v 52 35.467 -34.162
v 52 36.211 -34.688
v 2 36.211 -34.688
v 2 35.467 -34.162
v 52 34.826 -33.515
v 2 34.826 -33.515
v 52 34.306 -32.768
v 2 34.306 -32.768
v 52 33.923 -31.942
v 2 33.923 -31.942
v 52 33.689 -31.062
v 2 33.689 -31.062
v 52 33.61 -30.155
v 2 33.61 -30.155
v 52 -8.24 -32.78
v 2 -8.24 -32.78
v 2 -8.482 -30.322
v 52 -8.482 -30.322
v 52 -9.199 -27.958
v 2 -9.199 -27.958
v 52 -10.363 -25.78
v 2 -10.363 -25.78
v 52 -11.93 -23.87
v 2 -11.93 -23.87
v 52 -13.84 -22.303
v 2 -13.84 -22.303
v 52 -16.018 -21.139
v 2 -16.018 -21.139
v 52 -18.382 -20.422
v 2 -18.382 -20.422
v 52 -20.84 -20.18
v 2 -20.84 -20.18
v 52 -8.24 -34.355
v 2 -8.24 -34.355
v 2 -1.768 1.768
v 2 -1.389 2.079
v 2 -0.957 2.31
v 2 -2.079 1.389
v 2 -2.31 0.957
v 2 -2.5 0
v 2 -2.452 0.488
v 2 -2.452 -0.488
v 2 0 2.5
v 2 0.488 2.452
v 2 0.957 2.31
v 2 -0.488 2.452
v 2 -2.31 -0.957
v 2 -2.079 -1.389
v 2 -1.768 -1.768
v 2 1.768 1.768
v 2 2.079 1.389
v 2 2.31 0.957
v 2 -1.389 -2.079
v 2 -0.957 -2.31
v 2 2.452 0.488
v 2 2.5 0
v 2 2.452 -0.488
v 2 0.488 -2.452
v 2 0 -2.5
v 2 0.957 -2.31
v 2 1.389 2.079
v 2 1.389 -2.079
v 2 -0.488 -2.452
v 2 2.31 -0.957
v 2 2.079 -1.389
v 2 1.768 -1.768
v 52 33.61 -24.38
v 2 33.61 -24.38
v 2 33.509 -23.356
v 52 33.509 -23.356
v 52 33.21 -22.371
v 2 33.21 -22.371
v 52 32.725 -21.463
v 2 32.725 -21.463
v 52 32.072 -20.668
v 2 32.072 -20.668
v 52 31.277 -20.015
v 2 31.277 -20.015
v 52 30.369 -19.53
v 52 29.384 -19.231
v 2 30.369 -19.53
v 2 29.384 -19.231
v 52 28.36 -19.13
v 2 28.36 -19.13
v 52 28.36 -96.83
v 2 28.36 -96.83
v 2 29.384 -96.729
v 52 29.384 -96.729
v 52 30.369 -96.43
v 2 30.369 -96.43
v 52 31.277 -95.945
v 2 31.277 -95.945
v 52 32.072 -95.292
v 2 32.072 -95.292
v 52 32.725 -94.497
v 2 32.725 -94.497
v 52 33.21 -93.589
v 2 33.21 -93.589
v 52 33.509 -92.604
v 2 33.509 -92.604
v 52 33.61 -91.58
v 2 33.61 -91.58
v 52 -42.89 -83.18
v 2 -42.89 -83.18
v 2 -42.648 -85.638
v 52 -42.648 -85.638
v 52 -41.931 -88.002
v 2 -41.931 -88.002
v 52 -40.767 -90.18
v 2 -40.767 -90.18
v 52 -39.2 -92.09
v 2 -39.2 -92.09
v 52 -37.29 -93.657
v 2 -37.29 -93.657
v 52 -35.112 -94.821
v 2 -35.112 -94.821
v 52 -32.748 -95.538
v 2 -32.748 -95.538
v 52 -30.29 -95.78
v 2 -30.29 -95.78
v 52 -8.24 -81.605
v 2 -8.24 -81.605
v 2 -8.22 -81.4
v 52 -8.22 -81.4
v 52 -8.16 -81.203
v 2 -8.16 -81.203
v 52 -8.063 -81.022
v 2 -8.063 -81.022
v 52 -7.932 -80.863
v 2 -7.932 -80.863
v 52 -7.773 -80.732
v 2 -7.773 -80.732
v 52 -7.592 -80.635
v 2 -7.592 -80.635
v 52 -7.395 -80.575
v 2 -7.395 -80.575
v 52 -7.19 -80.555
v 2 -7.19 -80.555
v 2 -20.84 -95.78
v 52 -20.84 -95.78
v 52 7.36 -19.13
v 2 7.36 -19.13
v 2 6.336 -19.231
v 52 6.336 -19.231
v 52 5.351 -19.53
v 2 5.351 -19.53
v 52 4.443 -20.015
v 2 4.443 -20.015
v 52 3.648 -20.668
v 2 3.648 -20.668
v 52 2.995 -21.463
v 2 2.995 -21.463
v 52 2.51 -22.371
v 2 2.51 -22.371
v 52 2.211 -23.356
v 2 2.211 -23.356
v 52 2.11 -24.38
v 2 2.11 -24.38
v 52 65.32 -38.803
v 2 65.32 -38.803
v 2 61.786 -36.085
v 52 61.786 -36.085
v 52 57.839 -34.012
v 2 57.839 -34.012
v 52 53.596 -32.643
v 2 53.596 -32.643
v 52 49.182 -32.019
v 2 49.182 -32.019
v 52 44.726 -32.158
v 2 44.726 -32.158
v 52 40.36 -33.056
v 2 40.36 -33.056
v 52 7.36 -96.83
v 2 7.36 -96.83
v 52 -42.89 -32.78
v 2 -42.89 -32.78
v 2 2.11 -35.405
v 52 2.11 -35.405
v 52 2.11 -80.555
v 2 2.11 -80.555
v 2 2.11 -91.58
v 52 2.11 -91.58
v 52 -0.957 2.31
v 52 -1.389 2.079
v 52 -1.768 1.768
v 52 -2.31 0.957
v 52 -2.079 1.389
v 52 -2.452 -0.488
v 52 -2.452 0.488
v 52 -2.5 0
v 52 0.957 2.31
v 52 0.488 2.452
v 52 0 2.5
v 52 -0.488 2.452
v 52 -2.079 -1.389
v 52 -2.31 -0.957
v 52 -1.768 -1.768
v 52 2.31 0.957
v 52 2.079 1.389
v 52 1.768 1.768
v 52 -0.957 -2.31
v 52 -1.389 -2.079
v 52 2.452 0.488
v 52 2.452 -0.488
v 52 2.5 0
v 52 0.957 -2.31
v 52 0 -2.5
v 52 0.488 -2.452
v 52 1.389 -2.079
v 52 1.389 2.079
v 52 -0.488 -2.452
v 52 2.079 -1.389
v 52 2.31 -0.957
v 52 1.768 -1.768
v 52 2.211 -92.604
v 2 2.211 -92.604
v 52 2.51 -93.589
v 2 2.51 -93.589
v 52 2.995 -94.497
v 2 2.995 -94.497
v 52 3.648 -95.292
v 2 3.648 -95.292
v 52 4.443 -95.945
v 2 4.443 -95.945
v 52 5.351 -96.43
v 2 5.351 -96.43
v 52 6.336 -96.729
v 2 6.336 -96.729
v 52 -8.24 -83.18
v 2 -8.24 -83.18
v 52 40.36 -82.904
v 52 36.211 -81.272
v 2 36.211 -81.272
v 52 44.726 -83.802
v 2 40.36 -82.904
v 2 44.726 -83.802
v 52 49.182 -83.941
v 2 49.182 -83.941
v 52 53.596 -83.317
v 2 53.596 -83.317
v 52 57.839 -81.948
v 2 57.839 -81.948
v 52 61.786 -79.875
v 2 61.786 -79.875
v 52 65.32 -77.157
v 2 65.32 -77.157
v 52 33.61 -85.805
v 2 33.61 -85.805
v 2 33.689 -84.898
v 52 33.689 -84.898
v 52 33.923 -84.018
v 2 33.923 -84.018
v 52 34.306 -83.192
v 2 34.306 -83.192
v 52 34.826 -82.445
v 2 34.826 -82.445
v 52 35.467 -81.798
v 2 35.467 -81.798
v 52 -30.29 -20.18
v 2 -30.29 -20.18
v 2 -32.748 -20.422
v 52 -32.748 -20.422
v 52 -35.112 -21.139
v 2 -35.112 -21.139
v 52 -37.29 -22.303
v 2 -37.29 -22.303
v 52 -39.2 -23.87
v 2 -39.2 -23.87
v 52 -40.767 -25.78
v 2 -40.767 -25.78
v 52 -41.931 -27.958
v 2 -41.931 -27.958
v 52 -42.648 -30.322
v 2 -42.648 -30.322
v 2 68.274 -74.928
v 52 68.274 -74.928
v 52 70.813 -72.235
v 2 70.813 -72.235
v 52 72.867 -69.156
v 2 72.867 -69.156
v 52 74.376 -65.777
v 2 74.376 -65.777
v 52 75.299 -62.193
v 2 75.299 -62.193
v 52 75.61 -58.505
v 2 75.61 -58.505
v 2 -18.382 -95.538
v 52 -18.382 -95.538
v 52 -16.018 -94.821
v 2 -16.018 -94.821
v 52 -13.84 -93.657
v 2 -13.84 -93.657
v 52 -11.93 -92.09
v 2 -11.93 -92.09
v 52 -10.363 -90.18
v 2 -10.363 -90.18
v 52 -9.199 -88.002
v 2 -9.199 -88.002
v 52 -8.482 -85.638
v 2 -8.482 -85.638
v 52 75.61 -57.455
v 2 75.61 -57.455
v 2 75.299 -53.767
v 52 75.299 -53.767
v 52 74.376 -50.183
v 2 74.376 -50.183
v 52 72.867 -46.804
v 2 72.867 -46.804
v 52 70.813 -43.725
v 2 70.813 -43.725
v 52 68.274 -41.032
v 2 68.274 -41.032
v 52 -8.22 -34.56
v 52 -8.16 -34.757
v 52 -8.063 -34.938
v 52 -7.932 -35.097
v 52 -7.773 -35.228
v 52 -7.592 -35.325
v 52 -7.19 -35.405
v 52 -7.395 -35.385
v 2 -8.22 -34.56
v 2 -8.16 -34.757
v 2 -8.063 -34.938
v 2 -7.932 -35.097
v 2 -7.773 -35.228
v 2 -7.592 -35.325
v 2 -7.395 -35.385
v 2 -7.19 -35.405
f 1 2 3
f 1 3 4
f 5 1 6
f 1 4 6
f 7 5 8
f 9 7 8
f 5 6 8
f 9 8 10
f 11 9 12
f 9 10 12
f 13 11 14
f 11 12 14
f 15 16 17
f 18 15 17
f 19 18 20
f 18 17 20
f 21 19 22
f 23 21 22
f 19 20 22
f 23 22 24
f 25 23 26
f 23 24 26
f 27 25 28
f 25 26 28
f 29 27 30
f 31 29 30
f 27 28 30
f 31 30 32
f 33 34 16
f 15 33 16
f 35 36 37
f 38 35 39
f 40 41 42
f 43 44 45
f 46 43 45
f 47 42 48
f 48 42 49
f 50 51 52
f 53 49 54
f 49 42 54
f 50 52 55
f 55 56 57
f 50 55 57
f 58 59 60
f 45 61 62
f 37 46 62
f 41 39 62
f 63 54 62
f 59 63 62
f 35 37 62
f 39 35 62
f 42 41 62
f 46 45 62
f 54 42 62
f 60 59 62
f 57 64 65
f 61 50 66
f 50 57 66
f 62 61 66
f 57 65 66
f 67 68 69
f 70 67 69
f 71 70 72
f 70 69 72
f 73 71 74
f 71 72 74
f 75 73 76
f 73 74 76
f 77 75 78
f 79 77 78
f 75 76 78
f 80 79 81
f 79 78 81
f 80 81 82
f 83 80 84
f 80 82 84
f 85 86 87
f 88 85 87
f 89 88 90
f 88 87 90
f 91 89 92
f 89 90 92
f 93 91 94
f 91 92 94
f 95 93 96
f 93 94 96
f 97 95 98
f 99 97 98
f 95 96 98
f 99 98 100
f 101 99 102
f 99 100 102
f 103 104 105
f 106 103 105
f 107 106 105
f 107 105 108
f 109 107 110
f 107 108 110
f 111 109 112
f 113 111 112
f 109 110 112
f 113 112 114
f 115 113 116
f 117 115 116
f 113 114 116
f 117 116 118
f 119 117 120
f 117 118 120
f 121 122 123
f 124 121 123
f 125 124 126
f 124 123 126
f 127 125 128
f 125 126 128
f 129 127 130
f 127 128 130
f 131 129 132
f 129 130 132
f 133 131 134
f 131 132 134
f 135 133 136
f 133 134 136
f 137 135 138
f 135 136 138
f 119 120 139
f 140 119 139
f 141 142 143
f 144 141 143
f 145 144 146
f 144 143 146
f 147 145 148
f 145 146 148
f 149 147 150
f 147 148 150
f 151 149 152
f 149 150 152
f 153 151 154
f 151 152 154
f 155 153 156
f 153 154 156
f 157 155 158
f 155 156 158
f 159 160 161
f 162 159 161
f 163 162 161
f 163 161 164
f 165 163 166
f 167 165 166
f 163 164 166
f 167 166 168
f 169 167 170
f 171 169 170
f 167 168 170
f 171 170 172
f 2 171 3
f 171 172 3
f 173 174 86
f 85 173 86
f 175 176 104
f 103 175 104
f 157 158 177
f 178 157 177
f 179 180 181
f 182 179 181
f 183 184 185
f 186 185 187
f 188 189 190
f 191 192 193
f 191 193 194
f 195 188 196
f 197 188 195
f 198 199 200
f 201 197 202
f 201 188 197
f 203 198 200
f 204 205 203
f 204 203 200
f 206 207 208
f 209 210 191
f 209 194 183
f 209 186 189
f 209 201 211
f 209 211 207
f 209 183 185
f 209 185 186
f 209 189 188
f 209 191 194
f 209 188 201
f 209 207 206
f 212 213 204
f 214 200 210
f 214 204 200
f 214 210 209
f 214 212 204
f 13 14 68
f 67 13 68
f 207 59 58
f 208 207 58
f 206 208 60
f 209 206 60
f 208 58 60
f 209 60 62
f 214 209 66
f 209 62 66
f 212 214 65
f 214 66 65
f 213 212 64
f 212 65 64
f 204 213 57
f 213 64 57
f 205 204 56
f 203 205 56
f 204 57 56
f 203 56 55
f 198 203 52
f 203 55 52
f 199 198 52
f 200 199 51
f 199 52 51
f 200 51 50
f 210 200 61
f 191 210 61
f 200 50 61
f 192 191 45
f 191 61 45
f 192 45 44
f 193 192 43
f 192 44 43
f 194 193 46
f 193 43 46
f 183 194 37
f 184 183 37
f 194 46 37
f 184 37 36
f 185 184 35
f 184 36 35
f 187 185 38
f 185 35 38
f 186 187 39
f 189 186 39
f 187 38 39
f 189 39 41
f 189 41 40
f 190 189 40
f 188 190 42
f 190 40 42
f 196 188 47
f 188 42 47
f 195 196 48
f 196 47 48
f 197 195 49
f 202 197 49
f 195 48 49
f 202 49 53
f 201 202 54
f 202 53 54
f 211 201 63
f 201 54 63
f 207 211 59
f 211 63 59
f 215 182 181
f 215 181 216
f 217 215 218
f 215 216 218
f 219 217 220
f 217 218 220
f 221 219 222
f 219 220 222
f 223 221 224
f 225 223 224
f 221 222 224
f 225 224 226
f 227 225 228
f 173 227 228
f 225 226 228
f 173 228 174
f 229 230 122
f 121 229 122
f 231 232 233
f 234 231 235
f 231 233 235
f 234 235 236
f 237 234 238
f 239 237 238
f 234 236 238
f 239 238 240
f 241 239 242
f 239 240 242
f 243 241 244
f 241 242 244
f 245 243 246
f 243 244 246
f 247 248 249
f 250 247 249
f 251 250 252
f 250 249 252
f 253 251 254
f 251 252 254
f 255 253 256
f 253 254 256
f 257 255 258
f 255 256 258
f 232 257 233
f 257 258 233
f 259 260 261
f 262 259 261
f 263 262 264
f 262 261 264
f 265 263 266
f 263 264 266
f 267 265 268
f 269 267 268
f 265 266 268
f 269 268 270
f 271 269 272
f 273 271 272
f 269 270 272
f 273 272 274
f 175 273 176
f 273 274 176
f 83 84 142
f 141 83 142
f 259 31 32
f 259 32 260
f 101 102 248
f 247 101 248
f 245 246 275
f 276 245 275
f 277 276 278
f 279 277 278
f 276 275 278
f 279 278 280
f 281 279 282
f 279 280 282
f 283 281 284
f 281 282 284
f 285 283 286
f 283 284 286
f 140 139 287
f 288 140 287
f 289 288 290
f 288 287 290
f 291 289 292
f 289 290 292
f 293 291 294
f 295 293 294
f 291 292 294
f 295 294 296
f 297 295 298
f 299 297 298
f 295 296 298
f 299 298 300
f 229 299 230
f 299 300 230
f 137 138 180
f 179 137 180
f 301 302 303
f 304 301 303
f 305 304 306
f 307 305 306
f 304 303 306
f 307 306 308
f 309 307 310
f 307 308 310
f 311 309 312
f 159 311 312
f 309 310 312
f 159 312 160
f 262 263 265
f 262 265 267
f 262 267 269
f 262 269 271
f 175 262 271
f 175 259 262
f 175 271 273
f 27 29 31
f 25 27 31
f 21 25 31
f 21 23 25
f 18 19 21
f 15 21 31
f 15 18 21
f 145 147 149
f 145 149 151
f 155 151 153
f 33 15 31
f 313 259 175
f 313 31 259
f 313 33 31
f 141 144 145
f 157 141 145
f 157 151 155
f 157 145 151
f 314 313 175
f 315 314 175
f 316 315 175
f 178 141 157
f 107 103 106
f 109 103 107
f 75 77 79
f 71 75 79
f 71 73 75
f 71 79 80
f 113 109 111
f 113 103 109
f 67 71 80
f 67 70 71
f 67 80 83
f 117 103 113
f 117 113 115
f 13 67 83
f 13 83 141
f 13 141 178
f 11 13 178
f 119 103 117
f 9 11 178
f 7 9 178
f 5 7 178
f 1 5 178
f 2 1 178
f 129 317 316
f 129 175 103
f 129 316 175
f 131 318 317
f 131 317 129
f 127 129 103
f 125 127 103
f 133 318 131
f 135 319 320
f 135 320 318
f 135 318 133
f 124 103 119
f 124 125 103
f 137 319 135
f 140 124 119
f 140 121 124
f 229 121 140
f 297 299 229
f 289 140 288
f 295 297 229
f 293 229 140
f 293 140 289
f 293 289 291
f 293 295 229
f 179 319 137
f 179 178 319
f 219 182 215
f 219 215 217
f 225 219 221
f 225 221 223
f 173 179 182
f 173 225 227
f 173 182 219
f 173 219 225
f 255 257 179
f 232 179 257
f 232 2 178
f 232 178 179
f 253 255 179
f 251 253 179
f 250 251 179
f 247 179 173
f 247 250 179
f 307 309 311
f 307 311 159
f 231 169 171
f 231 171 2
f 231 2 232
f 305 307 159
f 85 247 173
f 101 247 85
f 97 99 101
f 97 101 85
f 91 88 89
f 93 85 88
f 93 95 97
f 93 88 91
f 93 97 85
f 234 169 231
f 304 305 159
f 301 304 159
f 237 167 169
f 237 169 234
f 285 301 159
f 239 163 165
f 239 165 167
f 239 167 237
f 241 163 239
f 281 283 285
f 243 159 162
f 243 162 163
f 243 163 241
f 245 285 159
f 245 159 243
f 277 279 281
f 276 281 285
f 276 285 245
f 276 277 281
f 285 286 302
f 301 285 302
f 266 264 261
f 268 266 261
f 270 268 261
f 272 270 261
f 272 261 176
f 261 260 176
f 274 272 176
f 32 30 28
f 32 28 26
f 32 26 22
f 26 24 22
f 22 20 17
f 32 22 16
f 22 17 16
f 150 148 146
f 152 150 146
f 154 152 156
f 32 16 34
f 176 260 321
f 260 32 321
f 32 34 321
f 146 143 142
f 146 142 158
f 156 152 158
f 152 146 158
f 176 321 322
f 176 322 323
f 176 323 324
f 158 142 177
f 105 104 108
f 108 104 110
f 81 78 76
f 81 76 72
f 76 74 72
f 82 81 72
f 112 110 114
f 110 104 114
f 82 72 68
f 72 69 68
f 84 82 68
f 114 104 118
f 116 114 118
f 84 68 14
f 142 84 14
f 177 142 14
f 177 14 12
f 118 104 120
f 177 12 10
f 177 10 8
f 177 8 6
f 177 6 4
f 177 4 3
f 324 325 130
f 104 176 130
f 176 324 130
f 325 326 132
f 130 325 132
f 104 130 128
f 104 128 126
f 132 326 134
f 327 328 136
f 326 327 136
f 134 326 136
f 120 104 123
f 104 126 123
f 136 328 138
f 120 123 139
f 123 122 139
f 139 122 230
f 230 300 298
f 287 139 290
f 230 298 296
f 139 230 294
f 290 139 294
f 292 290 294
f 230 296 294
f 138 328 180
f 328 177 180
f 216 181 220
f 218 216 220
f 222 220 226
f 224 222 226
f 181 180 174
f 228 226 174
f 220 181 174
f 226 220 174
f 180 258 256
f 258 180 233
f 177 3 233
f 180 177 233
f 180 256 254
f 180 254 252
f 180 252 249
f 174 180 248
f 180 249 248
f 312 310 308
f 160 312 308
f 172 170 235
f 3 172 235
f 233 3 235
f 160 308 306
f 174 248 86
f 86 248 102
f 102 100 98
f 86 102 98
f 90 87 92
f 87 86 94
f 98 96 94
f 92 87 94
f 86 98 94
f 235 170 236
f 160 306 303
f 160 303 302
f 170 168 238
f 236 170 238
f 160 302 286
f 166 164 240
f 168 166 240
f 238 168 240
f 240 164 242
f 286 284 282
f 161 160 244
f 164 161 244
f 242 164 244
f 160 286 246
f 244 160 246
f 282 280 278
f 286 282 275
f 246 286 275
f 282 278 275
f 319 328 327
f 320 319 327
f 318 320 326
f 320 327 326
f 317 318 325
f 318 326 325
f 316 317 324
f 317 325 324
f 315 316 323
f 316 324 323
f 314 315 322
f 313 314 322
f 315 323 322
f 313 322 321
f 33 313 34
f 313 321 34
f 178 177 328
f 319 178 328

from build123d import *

# Parameters (mm, degrees)
SKETCH1_R             = 101.87
SKETCH1_R_2           = 11
BOSS_EXTRUDE1_DEPTH   = 2
CUT_EXTRUDE1_START    = -2
CUT_EXTRUDE1_DEPTH    = 2
CUT_EXTRUDE2_START    = -2
CUT_EXTRUDE2_DEPTH    = 2
SKETCH4_R             = 26
CUT_EXTRUDE3_DEPTH    = 2
SKETCH5_R             = 2.5
BOSS_EXTRUDE2_DEPTH   = 50
BOSS_EXTRUDE2_2_DEPTH = 50


# Read off the part's stored shape, not the designer's step: Cut-Extrude1, Cut-Extrude2
with BuildPart() as part:
    # Sketch1 → Boss-Extrude1 (new body)
    with BuildSketch(Plane(origin=(0, 0, 0), x_dir=(0, 0, -1), z_dir=(1, 0, 0))):
        Circle(SKETCH1_R)
        Circle(SKETCH1_R_2, mode=Mode.SUBTRACT)
    extrude(amount=BOSS_EXTRUDE1_DEPTH)

    # Cut-Extrude1 outline → Cut-Extrude1 (cut)
    with BuildSketch(Plane(origin=(2, 0, 0), x_dir=(0, 0, -1), z_dir=(1, 0, 0)).offset(CUT_EXTRUDE1_START)):
        with BuildLine():
            Line((96.83, 7.36), (96.83, 28.36))
            ThreePointArc((96.83, 28.36), (95.292310601, 32.072310601), (91.58, 33.61))
            Line((91.58, 33.61), (85.805, 33.61))
            ThreePointArc((85.805, 33.61), (82.092689399, 35.147689399), (80.555, 38.86))
            Line((80.555, 38.86), (80.555, 53.56))
            ThreePointArc((80.555, 53.56), (74.096704525, 69.151704525), (58.505, 75.61))
            Line((58.505, 75.61), (57.455, 75.61))
            ThreePointArc((57.455, 75.61), (41.863295475, 69.151704525), (35.405, 53.56))
            Line((35.405, 53.56), (35.405, 38.86))
            ThreePointArc((35.405, 38.86), (33.867310601, 35.147689399), (30.155, 33.61))
            Line((30.155, 33.61), (24.38, 33.61))
            ThreePointArc((24.38, 33.61), (20.667689399, 32.072310601), (19.13, 28.36))
            Line((19.13, 28.36), (19.13, 7.36))
            ThreePointArc((19.13, 7.36), (20.667689399, 3.647689399), (24.38, 2.11))
            Line((24.38, 2.11), (91.58, 2.11))
            ThreePointArc((91.58, 2.11), (95.292310601, 3.647689399), (96.83, 7.36))
        make_face()
    extrude(amount=CUT_EXTRUDE1_DEPTH, mode=Mode.SUBTRACT)

    # Cut-Extrude2 outline → Cut-Extrude2 (cut)
    with BuildSketch(Plane(origin=(2, 0, 0), x_dir=(0, 0, -1), z_dir=(1, 0, 0)).offset(CUT_EXTRUDE2_START)):
        with BuildLine():
            Line((80.555, 2.11), (35.405, 2.11))
            Line((35.405, 2.11), (35.405, -7.19))
            ThreePointArc((35.405, -7.19), (35.09746212, -7.93246212), (34.355, -8.24))
            Line((34.355, -8.24), (32.78, -8.24))
            ThreePointArc((32.78, -8.24), (23.870454557, -11.930454557), (20.18, -20.84))
            Line((20.18, -20.84), (20.18, -30.29))
            ThreePointArc((20.18, -30.29), (23.870454557, -39.199545443), (32.78, -42.89))
            Line((32.78, -42.89), (83.18, -42.89))
            ThreePointArc((83.18, -42.89), (92.089545443, -39.199545443), (95.78, -30.29))
            Line((95.78, -30.29), (95.78, -20.84))
            ThreePointArc((95.78, -20.84), (92.089545443, -11.930454557), (83.18, -8.24))
            Line((83.18, -8.24), (81.605, -8.24))
            ThreePointArc((81.605, -8.24), (80.86253788, -7.93246212), (80.555, -7.19))
            Line((80.555, -7.19), (80.555, 2.11))
        make_face()
    extrude(amount=CUT_EXTRUDE2_DEPTH, mode=Mode.SUBTRACT)

    # Sketch4 → Cut-Extrude3 (cut)
    with BuildSketch(Plane(origin=(2, 0, 0), x_dir=(0, 0, -1), z_dir=(1, 0, 0))):
        with Locations((57.98, 47.76331228)):
            Circle(SKETCH4_R)
    extrude(amount=-CUT_EXTRUDE3_DEPTH, mode=Mode.SUBTRACT)


with BuildPart() as body_2:
    # Sketch5 → Boss-Extrude2 (new body)
    with BuildSketch(Plane(origin=(2, 0, 0), x_dir=(0, 0, -1), z_dir=(1, 0, 0))):
        Circle(SKETCH5_R)
    extrude(amount=BOSS_EXTRUDE2_DEPTH)


with BuildPart() as body_3:
    # Sketch5 → Boss-Extrude2 2 (new body)
    with BuildSketch(Plane(origin=(2, 0, 0), x_dir=(0, 0, -1), z_dir=(1, 0, 0))):
        with BuildLine():
            ThreePointArc((81.272452679, 36.210752035), (83.724025312, 51.402702438), (77.157360564, 65.31975958))
            ThreePointArc((77.157360564, 65.31975958), (69.156286337, 72.866801894), (58.505, 75.61))
            Line((58.505, 75.61), (57.455, 75.61))
            ThreePointArc((57.455, 75.61), (46.803713663, 72.866801894), (38.802639436, 65.31975958))
            ThreePointArc((38.802639436, 65.31975958), (32.235974688, 51.402702438), (34.687547321, 36.210752035))
            ThreePointArc((34.687547321, 36.210752035), (32.767847889, 34.306372226), (30.155, 33.61))
            Line((30.155, 33.61), (24.38, 33.61))
            ThreePointArc((24.38, 33.61), (20.667689399, 32.072310601), (19.13, 28.36))
            Line((19.13, 28.36), (19.13, 7.36))
            ThreePointArc((19.13, 7.36), (20.667689399, 3.647689399), (24.38, 2.11))
            Line((24.38, 2.11), (35.405, 2.11))
            Line((35.405, 2.11), (35.405, -7.19))
            ThreePointArc((35.405, -7.19), (35.09746212, -7.93246212), (34.355, -8.24))
            Line((34.355, -8.24), (32.78, -8.24))
            ThreePointArc((32.78, -8.24), (23.870454557, -11.930454557), (20.18, -20.84))
            Line((20.18, -20.84), (20.18, -30.29))
            ThreePointArc((20.18, -30.29), (23.870454557, -39.199545443), (32.78, -42.89))
            Line((32.78, -42.89), (83.18, -42.89))
            ThreePointArc((83.18, -42.89), (92.089545443, -39.199545443), (95.78, -30.29))
            Line((95.78, -30.29), (95.78, -20.84))
            ThreePointArc((95.78, -20.84), (92.089545443, -11.930454557), (83.18, -8.24))
            Line((83.18, -8.24), (81.605, -8.24))
            ThreePointArc((81.605, -8.24), (80.86253788, -7.93246212), (80.555, -7.19))
            Line((80.555, -7.19), (80.555, 2.11))
            Line((80.555, 2.11), (91.58, 2.11))
            ThreePointArc((91.58, 2.11), (95.292310601, 3.647689399), (96.83, 7.36))
            Line((96.83, 7.36), (96.83, 28.36))
            ThreePointArc((96.83, 28.36), (95.292310601, 32.072310601), (91.58, 33.61))
            Line((91.58, 33.61), (85.805, 33.61))
            ThreePointArc((85.805, 33.61), (83.192152111, 34.306372226), (81.272452679, 36.210752035))
        make_face()
    extrude(amount=BOSS_EXTRUDE2_2_DEPTH)


solid = Compound([body_2.part, body_3.part])
